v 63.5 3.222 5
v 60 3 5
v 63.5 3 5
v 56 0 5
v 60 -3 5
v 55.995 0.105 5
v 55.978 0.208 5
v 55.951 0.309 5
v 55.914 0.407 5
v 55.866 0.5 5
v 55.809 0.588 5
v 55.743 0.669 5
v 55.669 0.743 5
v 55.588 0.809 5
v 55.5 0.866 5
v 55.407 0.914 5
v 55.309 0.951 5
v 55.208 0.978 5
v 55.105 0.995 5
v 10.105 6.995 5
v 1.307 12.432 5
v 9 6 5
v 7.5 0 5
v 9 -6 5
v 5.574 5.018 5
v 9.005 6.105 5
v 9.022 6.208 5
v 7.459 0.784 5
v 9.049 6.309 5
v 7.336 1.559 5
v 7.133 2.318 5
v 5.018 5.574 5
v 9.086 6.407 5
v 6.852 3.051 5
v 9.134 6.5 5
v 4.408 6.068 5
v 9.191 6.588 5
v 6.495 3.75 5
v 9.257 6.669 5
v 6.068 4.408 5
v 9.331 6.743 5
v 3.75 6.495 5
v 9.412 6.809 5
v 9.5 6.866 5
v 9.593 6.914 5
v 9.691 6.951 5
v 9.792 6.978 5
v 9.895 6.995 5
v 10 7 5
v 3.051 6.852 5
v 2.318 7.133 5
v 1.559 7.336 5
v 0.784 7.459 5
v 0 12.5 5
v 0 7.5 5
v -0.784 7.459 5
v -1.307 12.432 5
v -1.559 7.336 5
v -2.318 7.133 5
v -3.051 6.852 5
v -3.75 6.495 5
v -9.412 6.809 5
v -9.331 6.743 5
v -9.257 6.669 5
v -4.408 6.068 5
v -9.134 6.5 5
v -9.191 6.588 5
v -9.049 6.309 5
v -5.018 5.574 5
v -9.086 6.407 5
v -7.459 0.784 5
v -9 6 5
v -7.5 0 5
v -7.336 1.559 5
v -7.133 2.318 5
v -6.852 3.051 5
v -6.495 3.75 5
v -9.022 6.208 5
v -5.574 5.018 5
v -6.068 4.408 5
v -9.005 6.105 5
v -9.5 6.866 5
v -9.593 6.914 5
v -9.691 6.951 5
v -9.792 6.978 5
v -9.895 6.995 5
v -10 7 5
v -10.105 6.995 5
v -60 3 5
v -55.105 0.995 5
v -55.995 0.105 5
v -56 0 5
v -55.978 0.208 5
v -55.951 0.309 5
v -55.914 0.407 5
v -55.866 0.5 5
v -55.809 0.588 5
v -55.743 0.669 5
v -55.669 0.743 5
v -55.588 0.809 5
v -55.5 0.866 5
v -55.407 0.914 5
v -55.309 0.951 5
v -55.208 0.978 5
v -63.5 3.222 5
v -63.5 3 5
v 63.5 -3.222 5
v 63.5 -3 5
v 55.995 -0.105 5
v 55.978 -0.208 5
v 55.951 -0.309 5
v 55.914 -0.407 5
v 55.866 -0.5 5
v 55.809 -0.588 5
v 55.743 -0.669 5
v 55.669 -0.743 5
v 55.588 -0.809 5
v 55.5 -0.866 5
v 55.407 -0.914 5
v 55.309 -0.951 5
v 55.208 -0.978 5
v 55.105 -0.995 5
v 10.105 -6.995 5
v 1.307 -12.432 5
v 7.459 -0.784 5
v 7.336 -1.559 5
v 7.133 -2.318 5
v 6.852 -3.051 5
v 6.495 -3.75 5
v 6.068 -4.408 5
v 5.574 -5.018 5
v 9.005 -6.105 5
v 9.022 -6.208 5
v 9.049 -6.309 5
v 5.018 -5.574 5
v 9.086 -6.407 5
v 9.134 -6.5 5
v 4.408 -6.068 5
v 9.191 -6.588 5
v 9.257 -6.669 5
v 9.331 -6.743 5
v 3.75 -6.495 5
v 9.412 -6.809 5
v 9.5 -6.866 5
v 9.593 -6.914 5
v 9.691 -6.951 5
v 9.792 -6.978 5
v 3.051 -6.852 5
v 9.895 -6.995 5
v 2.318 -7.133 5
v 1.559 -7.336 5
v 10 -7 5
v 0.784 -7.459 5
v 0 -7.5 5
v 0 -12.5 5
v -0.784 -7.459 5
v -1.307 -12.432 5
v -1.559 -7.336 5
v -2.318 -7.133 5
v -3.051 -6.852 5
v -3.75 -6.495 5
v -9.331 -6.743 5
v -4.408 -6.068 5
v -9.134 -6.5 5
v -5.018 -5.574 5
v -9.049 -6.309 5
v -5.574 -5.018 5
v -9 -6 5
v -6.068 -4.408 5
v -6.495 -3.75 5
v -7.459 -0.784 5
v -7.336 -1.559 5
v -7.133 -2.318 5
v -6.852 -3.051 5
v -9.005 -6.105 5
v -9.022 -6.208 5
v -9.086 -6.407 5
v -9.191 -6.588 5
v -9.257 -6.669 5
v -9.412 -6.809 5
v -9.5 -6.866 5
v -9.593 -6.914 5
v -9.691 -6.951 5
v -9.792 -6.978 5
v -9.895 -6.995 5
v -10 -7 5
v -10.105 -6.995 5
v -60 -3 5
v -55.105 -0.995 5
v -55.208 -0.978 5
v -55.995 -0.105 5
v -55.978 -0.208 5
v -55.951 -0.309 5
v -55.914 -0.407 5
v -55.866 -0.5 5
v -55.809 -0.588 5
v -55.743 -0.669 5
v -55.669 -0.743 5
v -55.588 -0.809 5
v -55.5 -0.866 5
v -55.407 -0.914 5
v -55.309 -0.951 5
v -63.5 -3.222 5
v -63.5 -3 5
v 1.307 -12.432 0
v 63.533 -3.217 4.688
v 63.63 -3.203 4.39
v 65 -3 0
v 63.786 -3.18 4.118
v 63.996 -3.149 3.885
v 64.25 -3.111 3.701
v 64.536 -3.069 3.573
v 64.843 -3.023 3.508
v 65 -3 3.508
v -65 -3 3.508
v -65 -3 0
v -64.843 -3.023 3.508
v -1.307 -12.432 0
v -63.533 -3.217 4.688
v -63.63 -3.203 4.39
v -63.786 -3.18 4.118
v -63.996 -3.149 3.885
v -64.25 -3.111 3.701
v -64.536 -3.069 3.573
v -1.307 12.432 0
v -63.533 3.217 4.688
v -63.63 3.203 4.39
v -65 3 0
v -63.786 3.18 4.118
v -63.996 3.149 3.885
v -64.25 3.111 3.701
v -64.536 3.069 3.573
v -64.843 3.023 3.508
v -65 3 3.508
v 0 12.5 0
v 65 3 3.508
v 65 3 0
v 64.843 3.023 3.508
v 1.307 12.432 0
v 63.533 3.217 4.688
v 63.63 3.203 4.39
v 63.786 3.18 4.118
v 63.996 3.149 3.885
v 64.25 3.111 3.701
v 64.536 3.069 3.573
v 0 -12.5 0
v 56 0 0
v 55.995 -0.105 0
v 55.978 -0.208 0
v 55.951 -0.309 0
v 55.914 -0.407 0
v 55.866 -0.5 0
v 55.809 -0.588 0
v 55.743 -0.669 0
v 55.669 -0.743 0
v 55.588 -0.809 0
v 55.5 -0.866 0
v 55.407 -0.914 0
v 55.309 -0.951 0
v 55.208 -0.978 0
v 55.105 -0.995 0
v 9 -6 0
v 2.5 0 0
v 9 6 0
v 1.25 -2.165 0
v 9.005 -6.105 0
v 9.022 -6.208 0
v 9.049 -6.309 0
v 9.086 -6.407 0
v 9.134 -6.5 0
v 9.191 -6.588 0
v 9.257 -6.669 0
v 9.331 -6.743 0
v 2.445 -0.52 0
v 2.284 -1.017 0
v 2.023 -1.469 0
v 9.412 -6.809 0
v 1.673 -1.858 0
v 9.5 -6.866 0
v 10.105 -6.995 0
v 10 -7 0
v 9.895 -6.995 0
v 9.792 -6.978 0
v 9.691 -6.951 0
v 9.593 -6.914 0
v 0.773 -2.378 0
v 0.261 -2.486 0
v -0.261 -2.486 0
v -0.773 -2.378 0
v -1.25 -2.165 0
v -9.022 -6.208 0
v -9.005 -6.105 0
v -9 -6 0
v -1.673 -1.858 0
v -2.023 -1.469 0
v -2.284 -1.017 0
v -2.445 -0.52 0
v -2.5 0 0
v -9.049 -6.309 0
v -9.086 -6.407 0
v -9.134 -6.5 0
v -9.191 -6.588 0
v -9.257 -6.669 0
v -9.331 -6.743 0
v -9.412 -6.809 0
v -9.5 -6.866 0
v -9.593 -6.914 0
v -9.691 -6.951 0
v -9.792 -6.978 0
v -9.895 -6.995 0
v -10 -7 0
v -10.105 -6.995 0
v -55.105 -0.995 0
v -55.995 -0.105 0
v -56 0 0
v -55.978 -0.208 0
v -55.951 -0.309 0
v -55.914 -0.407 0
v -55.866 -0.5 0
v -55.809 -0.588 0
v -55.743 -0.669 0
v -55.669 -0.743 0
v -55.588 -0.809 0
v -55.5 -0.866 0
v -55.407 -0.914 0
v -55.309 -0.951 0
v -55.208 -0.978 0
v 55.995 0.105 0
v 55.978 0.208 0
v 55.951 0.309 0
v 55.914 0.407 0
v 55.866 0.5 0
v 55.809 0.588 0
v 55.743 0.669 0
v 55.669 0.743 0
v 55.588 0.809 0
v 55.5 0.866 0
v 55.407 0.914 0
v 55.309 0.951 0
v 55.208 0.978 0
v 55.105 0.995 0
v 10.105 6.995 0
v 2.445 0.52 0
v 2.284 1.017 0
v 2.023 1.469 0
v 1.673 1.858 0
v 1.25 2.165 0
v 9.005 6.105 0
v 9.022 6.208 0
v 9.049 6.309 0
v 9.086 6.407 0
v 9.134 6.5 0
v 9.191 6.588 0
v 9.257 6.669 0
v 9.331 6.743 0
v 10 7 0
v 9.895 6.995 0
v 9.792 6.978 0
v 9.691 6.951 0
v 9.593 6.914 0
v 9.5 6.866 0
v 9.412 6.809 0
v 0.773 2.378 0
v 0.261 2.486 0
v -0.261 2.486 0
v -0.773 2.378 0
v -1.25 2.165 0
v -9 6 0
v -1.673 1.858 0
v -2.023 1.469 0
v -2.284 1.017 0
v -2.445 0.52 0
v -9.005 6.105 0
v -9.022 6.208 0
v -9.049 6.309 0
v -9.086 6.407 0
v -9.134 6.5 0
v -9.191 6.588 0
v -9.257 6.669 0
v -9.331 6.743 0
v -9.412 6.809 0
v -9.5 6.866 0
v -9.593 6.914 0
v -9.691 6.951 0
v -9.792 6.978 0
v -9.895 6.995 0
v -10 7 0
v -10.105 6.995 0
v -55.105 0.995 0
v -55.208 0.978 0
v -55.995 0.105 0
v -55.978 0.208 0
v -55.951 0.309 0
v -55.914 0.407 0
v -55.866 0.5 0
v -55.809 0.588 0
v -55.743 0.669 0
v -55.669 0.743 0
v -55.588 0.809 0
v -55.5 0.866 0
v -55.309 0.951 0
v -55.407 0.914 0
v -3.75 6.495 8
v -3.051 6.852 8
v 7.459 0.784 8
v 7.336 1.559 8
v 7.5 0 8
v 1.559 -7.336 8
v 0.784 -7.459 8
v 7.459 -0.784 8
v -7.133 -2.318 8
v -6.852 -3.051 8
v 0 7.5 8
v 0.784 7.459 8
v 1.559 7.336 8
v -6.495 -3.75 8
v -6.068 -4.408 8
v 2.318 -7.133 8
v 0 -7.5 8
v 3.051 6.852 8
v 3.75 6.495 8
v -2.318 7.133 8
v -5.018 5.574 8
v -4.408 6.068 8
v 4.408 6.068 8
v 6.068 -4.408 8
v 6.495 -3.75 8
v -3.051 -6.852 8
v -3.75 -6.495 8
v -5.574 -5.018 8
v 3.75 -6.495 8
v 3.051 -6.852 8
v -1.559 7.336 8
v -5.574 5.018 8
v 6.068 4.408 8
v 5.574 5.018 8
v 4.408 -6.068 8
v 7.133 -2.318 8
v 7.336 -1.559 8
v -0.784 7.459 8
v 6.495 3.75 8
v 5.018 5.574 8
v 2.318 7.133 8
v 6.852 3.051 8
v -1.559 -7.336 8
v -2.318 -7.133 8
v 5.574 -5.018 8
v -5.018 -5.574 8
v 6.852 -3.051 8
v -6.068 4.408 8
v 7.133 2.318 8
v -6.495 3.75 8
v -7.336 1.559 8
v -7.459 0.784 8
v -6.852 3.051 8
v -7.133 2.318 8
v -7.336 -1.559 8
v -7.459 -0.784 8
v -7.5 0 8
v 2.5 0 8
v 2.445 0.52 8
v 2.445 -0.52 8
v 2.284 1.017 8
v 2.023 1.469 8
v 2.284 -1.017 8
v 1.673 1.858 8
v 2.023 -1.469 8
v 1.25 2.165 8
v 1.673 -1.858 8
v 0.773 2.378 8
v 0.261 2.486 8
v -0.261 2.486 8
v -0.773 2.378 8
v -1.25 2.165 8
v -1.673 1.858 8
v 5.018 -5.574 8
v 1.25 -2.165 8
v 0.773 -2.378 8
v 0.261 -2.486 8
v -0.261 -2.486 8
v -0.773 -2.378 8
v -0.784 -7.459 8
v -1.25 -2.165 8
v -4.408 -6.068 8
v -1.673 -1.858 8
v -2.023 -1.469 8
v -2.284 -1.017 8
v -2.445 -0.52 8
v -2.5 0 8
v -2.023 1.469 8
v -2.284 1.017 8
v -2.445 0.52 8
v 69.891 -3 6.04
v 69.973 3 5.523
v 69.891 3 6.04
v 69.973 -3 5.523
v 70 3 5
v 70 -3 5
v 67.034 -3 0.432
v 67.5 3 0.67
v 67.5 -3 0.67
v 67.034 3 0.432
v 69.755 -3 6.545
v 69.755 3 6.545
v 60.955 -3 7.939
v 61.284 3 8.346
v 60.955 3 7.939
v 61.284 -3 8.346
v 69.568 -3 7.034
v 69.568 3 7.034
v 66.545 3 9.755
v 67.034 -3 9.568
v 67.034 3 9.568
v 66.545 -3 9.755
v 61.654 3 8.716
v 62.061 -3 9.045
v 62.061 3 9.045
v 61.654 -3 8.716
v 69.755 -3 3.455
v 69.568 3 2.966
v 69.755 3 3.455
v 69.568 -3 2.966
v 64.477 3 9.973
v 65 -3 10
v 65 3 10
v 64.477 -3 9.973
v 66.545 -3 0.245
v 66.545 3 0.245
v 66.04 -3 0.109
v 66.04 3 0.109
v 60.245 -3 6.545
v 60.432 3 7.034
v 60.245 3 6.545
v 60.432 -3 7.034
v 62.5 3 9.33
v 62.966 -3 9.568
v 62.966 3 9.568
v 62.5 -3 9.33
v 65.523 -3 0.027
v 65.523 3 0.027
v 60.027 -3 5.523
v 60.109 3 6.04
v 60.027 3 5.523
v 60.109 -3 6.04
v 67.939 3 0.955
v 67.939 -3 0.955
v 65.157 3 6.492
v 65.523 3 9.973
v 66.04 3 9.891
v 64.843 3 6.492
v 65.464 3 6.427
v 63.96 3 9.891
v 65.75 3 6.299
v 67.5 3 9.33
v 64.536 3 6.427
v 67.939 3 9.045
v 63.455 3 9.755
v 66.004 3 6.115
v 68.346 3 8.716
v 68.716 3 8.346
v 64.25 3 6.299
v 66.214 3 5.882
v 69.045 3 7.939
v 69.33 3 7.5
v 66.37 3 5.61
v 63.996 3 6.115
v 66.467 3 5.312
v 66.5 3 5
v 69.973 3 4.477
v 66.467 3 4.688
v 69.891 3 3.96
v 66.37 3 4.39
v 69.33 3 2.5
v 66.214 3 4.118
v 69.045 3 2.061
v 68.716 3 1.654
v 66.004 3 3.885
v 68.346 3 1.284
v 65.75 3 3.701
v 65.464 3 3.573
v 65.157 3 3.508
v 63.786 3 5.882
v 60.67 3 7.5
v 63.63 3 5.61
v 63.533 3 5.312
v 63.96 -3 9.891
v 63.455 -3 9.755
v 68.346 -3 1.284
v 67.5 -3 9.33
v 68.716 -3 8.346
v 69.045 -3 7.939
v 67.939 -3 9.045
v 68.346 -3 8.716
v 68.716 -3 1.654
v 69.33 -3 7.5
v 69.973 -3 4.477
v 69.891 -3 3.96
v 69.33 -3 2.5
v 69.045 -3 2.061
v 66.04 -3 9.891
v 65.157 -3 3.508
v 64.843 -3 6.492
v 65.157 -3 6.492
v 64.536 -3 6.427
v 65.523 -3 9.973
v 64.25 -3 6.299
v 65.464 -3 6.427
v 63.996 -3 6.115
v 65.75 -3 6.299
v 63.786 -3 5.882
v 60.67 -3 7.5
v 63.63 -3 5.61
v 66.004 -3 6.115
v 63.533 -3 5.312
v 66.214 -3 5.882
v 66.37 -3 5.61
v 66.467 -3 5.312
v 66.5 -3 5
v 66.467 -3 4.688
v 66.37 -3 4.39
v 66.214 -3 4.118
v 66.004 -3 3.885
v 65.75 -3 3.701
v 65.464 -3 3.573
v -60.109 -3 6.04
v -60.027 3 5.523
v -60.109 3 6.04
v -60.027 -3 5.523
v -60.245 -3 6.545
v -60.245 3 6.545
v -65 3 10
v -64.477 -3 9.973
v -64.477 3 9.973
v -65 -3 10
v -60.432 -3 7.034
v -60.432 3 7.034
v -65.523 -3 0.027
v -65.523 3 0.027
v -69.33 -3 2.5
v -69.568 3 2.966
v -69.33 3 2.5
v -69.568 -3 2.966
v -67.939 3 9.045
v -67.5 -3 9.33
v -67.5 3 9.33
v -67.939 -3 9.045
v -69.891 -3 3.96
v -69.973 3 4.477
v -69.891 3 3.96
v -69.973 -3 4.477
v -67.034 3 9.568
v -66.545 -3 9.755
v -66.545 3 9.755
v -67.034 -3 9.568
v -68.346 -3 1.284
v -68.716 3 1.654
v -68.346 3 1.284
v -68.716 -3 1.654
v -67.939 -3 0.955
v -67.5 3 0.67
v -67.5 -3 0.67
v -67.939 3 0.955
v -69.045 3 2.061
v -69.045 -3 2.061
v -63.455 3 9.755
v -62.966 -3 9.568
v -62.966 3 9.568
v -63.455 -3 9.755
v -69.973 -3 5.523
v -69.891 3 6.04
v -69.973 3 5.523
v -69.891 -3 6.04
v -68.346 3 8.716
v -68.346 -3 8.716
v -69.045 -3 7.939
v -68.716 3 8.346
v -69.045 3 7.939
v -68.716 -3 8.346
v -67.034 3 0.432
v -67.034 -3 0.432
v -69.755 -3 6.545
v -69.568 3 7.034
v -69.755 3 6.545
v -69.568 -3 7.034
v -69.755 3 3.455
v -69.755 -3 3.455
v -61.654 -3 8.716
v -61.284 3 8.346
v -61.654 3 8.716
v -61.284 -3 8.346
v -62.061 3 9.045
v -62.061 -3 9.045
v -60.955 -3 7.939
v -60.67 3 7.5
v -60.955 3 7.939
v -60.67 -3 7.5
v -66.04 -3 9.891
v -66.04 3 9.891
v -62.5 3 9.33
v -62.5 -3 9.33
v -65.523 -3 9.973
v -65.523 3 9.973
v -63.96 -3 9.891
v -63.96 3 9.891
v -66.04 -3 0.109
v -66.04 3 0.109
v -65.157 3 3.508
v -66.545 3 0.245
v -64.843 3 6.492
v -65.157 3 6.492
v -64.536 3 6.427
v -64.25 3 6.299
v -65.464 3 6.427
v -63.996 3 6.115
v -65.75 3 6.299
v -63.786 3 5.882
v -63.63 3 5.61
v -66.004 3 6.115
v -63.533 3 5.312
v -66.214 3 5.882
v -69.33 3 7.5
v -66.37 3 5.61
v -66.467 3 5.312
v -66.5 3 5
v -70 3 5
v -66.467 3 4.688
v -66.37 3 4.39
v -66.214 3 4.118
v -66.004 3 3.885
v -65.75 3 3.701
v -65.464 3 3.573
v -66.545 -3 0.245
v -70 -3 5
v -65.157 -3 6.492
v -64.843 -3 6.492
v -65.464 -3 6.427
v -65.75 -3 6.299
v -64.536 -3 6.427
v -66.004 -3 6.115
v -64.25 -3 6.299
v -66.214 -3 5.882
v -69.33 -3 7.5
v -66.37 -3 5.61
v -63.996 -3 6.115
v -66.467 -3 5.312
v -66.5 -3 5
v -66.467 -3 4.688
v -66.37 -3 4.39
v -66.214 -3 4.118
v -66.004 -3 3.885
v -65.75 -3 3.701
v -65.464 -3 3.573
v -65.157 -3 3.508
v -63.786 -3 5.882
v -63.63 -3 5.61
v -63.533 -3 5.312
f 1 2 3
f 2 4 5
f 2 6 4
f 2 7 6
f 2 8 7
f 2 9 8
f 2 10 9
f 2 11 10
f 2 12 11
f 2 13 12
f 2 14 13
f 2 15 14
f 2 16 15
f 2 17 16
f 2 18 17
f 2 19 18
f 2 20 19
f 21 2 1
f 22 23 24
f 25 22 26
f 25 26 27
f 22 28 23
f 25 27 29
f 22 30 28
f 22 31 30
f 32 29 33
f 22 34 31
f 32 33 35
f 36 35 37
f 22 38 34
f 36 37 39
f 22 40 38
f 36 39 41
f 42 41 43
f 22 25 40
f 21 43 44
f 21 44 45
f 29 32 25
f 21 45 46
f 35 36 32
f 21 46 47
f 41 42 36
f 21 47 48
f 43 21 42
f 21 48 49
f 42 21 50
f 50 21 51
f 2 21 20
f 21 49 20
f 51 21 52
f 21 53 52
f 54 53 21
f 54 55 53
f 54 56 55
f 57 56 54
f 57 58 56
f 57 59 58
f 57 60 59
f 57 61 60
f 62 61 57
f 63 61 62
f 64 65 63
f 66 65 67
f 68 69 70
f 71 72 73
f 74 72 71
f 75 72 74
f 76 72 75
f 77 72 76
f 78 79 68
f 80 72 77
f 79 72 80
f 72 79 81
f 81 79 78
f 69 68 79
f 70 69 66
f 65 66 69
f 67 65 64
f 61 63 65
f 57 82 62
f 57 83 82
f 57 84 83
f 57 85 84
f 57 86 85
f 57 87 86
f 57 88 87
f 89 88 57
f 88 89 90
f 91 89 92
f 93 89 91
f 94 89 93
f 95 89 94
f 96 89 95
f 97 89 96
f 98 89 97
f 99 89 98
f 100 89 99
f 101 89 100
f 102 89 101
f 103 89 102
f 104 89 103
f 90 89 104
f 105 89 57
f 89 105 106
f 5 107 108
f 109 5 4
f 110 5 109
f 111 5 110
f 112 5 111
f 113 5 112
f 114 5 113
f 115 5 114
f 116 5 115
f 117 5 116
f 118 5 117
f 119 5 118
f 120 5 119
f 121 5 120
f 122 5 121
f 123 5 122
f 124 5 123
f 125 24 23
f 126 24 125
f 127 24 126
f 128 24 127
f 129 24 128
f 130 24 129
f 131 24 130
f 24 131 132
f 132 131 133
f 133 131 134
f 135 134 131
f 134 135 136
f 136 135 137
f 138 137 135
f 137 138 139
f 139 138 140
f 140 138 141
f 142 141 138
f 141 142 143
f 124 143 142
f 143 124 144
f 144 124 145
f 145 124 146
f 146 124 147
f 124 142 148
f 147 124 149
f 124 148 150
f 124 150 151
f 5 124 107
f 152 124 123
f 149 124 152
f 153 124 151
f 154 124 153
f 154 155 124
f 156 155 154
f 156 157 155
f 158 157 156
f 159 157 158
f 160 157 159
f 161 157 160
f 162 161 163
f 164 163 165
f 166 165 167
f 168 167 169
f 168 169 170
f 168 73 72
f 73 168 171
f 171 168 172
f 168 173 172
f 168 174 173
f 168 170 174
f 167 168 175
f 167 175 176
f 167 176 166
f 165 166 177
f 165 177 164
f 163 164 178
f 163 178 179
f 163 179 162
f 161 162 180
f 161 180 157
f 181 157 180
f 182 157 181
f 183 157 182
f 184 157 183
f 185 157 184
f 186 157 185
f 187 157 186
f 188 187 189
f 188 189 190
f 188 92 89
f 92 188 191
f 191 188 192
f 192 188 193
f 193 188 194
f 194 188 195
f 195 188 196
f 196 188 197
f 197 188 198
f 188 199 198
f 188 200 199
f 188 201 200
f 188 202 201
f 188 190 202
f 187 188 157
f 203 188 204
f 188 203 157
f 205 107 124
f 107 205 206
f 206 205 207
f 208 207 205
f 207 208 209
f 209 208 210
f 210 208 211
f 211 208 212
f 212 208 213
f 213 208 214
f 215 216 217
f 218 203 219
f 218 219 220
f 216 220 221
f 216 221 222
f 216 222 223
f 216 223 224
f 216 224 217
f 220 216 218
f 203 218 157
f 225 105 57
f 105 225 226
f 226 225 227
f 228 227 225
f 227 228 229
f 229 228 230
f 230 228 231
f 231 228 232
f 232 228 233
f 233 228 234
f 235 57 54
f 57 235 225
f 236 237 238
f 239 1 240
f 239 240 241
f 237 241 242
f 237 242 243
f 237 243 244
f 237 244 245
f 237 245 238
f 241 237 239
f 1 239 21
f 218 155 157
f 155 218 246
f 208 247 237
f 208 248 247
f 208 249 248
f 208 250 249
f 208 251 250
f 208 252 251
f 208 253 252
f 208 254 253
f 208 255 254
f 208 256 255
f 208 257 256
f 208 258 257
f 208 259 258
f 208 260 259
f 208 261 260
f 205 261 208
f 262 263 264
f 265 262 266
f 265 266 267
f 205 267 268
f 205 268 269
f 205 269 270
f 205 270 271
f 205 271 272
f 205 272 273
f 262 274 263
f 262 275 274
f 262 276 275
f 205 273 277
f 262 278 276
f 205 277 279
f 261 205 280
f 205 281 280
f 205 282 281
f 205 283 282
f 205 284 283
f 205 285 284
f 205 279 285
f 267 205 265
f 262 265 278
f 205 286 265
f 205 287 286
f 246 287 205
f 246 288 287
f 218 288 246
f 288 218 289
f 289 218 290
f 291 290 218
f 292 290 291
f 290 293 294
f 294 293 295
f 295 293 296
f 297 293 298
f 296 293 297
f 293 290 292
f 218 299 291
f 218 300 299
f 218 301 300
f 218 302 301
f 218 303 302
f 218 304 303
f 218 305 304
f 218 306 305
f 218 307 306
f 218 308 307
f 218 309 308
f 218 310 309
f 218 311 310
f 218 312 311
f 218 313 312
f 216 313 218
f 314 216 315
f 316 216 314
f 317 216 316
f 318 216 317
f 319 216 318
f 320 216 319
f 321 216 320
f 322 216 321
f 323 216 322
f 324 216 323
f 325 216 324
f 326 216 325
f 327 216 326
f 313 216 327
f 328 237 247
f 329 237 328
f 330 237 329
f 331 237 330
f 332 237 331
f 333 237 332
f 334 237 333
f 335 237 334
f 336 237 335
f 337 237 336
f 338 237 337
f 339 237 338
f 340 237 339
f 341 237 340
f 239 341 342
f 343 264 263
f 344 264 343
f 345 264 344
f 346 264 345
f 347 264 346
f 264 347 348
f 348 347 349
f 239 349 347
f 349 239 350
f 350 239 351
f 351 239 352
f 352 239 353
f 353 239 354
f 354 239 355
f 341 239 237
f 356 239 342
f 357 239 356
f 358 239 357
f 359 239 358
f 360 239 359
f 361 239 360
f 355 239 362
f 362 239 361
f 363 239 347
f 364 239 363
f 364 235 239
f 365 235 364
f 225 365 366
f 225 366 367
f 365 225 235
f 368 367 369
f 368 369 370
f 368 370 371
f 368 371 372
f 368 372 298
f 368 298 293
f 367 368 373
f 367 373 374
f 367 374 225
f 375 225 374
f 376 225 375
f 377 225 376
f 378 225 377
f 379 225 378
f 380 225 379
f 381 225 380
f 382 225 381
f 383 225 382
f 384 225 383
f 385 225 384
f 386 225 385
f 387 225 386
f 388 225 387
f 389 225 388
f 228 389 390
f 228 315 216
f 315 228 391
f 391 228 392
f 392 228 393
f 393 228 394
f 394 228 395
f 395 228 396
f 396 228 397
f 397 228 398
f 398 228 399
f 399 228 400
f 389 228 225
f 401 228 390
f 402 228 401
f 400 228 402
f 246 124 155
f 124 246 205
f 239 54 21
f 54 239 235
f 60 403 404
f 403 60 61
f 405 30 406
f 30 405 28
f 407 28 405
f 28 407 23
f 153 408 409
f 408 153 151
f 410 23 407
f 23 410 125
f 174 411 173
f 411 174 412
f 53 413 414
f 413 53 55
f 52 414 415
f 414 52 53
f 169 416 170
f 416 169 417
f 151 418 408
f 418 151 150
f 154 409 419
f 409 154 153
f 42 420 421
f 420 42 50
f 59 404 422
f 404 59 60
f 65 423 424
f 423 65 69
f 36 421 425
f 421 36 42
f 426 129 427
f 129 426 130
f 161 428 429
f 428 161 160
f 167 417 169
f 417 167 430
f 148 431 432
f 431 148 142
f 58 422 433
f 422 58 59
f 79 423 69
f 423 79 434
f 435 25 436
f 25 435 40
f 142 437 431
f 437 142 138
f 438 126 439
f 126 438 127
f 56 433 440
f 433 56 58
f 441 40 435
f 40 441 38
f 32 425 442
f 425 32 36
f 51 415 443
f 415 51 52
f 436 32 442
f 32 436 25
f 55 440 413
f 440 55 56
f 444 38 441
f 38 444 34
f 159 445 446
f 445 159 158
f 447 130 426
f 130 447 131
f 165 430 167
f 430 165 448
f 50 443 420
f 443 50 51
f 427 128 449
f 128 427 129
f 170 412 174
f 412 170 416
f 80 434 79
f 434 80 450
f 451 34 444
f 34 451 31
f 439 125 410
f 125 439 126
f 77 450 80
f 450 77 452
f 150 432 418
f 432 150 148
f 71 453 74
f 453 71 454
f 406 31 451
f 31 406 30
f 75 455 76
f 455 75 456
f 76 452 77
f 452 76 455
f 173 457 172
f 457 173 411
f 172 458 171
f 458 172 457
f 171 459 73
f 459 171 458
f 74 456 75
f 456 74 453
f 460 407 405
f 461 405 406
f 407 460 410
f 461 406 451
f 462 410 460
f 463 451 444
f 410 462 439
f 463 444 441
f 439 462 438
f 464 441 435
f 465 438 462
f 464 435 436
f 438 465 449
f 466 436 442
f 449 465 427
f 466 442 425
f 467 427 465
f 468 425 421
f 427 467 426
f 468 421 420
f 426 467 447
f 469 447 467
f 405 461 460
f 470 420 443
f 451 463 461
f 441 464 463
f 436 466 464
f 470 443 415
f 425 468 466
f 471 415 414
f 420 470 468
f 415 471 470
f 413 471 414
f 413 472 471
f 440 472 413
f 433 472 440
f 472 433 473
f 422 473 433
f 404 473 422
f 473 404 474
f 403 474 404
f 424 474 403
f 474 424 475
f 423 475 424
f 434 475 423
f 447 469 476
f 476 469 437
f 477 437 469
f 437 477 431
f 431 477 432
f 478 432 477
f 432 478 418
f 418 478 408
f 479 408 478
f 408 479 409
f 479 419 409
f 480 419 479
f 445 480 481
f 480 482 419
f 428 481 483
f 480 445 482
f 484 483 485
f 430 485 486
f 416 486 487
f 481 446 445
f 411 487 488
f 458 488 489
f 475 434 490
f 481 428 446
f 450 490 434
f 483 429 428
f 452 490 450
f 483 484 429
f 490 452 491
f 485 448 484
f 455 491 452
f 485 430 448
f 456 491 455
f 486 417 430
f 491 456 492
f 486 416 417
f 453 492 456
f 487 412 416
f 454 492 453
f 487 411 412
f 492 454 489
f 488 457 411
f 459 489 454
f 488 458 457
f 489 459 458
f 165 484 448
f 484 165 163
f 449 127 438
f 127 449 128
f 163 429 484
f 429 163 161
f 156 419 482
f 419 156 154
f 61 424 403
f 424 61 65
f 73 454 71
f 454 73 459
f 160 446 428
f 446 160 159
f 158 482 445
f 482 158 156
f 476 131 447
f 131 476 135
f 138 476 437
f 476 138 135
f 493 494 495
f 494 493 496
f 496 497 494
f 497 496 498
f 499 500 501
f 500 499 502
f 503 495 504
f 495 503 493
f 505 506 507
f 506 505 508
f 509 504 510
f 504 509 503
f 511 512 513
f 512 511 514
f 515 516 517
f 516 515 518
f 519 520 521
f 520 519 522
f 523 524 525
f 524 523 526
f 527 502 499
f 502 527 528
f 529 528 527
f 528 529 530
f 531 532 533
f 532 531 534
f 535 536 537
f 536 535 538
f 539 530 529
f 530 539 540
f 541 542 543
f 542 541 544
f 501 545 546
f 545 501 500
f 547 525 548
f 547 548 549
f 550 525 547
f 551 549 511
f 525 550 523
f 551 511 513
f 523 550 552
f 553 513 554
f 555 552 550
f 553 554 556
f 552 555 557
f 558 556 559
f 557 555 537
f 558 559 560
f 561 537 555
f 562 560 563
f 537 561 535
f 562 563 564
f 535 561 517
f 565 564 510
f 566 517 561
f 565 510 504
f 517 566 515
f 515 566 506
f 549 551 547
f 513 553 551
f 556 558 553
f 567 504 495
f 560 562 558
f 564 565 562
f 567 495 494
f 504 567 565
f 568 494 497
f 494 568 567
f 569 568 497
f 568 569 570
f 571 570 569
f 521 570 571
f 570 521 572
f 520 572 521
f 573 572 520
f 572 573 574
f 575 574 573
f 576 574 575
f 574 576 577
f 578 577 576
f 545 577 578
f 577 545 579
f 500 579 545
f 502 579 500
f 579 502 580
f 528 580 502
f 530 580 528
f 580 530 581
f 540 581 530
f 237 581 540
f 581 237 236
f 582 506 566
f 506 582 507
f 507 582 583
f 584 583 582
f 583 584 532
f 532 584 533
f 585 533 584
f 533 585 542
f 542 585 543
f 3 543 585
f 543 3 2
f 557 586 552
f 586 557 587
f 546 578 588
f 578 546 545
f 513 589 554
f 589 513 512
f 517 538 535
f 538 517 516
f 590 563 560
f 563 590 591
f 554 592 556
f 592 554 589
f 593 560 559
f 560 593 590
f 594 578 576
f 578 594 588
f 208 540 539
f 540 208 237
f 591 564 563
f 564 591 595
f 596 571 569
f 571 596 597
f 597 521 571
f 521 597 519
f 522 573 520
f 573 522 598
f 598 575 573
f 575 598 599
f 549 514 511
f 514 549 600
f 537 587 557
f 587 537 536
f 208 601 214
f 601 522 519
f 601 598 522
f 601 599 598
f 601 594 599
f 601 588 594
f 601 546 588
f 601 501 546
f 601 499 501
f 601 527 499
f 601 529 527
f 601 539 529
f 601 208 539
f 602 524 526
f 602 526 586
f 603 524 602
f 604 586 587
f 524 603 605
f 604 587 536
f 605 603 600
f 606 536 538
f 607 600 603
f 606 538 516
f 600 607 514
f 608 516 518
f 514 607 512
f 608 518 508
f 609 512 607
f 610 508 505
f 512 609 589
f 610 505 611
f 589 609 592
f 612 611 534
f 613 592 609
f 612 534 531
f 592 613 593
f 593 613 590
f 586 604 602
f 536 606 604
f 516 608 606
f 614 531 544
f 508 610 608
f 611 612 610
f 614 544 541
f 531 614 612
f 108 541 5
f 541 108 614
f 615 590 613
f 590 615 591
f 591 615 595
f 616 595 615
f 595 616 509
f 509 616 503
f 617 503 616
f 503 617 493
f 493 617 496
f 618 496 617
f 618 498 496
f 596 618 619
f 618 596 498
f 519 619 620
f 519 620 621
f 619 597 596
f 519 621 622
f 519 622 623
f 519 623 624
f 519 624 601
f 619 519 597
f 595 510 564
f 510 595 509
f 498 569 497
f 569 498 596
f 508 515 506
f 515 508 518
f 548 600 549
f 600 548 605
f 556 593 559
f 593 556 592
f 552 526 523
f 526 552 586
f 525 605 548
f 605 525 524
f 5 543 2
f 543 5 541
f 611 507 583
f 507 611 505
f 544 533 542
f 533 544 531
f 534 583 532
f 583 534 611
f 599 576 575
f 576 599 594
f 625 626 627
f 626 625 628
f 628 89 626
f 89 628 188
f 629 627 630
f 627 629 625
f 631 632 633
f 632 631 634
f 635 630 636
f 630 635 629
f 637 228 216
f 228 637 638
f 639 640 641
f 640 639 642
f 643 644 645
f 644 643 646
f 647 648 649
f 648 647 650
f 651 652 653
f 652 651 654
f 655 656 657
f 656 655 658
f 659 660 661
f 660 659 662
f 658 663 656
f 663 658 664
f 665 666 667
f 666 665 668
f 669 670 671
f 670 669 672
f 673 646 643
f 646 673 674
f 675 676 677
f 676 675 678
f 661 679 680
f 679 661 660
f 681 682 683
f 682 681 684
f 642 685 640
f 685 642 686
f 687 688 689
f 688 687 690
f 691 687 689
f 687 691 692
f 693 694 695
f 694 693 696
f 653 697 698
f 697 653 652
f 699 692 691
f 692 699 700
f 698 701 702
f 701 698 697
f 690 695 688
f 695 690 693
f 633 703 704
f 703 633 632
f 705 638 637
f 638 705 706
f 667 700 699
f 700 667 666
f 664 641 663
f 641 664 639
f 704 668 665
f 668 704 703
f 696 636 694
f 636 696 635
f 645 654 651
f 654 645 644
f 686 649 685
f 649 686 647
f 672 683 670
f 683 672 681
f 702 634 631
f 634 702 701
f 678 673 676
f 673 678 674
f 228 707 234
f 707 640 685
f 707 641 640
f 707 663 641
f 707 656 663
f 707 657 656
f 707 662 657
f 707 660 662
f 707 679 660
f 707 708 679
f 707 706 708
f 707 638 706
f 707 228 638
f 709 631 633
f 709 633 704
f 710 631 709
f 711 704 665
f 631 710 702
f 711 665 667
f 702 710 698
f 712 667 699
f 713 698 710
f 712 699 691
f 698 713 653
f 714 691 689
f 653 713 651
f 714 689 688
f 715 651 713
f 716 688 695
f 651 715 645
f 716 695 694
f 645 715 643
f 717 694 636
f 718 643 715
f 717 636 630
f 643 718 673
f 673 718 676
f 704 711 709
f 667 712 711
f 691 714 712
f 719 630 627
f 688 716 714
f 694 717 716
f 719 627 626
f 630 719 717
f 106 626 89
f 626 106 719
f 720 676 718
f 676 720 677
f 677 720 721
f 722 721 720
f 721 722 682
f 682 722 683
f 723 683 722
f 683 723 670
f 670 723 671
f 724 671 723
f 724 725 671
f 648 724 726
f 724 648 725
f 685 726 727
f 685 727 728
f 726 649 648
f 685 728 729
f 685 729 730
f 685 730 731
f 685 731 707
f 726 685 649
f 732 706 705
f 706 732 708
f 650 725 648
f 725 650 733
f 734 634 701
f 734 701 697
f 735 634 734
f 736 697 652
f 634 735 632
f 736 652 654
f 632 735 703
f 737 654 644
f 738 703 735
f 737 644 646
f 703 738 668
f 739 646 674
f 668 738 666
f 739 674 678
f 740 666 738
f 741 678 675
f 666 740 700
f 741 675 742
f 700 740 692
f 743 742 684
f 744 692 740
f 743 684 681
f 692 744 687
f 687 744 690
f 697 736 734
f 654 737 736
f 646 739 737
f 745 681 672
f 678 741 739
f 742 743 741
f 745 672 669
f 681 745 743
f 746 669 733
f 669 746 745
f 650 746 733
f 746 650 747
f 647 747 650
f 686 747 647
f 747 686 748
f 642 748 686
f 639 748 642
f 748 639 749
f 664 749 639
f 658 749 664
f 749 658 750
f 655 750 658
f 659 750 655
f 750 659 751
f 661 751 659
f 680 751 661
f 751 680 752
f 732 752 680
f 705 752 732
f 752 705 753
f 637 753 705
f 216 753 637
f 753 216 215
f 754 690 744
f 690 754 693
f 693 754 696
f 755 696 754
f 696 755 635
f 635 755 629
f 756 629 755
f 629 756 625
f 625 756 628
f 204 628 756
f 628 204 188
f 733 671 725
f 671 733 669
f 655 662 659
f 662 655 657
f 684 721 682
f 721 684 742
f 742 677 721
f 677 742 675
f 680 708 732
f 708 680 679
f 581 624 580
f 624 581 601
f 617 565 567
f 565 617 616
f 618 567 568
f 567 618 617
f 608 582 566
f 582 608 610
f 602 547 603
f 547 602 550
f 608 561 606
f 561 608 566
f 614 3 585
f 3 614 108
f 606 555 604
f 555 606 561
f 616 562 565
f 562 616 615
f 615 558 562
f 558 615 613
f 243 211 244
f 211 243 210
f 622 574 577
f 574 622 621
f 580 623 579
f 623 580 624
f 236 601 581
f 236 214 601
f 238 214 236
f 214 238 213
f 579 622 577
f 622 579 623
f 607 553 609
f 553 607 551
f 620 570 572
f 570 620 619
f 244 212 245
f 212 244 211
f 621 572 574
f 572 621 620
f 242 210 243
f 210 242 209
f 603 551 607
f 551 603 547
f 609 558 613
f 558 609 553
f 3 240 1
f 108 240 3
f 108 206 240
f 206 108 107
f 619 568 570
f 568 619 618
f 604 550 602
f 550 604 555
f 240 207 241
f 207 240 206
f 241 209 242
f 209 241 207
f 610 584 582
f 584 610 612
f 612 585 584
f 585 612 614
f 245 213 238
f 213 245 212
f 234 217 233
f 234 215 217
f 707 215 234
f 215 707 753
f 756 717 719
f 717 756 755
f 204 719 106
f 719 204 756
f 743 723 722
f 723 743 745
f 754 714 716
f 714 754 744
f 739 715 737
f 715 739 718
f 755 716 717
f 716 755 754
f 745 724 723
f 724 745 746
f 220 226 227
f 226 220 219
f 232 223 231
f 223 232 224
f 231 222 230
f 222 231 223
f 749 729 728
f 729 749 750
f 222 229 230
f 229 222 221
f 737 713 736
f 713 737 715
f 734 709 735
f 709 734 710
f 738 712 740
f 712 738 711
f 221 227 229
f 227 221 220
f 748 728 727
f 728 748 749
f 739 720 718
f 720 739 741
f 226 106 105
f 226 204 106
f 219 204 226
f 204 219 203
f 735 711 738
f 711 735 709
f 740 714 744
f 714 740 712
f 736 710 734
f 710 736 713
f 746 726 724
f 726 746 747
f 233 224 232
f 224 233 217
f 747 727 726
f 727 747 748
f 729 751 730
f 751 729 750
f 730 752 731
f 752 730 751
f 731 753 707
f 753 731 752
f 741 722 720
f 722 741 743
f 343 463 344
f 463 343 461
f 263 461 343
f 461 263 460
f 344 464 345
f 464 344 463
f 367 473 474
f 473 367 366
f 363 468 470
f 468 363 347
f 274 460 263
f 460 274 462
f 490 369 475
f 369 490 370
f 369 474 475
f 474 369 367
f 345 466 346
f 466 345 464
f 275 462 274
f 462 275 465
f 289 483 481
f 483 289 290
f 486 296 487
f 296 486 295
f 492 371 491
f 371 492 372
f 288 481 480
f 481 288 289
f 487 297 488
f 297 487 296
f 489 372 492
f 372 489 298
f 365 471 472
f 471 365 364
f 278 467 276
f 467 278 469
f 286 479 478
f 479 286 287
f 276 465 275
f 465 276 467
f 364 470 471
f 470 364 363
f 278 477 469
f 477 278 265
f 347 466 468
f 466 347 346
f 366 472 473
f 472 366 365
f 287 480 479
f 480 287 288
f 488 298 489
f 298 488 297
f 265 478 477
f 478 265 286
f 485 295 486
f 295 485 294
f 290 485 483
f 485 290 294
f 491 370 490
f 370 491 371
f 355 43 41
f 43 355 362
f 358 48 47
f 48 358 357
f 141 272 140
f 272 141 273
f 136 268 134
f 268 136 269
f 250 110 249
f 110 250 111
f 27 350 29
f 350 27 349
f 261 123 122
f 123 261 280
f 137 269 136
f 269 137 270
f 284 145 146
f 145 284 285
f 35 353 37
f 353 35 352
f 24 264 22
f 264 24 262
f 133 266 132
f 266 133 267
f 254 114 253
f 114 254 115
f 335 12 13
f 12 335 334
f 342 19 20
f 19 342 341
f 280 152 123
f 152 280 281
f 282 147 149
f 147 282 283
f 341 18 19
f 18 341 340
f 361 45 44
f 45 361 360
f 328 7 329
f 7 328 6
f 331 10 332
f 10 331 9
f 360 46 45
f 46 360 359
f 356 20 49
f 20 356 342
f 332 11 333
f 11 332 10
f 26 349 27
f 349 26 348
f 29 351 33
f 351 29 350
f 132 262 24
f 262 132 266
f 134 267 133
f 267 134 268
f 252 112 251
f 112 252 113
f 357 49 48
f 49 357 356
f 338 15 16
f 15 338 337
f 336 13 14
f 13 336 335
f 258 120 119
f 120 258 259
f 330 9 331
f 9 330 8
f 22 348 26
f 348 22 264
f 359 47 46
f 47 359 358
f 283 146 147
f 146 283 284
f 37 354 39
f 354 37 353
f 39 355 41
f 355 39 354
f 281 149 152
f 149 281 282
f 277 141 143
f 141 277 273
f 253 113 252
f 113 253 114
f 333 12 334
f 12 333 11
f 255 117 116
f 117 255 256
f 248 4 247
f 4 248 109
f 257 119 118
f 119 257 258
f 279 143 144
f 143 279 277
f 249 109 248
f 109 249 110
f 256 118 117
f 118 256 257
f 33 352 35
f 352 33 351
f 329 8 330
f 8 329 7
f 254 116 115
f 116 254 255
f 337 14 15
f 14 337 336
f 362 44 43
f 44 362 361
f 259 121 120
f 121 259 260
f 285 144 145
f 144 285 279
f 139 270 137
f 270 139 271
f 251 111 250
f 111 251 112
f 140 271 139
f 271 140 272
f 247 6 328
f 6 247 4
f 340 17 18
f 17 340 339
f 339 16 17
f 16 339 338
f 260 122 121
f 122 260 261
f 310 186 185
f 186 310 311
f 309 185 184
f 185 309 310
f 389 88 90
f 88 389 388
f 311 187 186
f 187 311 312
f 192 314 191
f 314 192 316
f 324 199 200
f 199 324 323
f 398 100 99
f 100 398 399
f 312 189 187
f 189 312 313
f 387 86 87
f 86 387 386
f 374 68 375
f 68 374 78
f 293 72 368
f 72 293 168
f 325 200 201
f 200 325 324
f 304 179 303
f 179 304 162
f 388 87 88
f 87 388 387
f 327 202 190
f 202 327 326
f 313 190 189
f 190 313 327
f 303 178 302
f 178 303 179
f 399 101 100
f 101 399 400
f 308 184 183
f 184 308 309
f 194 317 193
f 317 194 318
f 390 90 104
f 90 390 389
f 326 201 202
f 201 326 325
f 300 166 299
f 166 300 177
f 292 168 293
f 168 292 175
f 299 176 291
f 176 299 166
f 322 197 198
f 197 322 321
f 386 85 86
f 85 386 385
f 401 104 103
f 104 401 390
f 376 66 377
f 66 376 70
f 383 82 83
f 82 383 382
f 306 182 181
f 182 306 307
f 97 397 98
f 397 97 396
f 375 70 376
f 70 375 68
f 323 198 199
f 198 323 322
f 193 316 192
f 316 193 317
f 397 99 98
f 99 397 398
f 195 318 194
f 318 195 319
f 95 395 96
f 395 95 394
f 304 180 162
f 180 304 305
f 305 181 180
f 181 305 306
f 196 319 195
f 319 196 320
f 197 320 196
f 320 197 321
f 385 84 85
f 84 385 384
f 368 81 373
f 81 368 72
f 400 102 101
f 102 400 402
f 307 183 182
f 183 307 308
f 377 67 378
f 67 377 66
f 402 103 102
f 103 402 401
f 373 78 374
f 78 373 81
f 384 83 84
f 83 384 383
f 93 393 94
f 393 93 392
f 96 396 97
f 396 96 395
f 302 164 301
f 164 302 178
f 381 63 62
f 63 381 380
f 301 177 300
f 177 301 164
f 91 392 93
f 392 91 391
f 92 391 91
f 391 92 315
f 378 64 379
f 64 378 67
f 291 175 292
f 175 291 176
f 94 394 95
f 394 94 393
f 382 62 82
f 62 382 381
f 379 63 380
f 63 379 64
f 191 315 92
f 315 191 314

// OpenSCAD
$fn=60;
difference(){
union(){
    
hull(){
cylinder(d=25,h=5);
translate([60,-3,0])cube([5,6,5]);
translate([-65,-3,0])cube([5,6,5]);
}
cylinder(d=15,h=8);

translate([65,0,5])rotate([90,0,0])
cylinder(d=10,h=6,center=true);

translate([-65,0,5])rotate([90,0,0])
cylinder(d=10,h=6,center=true);
}

translate([65,0,5])rotate([90,0,0])
cylinder(d=3,h=7,center=true,$fn=30);

translate([-65,0,5])rotate([90,0,0])
cylinder(d=3,h=7,center=true,$fn=30);

cylinder(d=5,h=10,$fn=30);

minkowski(){
linear_extrude(10)
polygon([[55,0],[10,6],[10,-6]]);
cylinder(d=2,h=1);
}

minkowski(){
linear_extrude(10)
polygon([[-55,0],[-10,6],[-10,-6]]);
cylinder(d=2,h=2);
}

}
